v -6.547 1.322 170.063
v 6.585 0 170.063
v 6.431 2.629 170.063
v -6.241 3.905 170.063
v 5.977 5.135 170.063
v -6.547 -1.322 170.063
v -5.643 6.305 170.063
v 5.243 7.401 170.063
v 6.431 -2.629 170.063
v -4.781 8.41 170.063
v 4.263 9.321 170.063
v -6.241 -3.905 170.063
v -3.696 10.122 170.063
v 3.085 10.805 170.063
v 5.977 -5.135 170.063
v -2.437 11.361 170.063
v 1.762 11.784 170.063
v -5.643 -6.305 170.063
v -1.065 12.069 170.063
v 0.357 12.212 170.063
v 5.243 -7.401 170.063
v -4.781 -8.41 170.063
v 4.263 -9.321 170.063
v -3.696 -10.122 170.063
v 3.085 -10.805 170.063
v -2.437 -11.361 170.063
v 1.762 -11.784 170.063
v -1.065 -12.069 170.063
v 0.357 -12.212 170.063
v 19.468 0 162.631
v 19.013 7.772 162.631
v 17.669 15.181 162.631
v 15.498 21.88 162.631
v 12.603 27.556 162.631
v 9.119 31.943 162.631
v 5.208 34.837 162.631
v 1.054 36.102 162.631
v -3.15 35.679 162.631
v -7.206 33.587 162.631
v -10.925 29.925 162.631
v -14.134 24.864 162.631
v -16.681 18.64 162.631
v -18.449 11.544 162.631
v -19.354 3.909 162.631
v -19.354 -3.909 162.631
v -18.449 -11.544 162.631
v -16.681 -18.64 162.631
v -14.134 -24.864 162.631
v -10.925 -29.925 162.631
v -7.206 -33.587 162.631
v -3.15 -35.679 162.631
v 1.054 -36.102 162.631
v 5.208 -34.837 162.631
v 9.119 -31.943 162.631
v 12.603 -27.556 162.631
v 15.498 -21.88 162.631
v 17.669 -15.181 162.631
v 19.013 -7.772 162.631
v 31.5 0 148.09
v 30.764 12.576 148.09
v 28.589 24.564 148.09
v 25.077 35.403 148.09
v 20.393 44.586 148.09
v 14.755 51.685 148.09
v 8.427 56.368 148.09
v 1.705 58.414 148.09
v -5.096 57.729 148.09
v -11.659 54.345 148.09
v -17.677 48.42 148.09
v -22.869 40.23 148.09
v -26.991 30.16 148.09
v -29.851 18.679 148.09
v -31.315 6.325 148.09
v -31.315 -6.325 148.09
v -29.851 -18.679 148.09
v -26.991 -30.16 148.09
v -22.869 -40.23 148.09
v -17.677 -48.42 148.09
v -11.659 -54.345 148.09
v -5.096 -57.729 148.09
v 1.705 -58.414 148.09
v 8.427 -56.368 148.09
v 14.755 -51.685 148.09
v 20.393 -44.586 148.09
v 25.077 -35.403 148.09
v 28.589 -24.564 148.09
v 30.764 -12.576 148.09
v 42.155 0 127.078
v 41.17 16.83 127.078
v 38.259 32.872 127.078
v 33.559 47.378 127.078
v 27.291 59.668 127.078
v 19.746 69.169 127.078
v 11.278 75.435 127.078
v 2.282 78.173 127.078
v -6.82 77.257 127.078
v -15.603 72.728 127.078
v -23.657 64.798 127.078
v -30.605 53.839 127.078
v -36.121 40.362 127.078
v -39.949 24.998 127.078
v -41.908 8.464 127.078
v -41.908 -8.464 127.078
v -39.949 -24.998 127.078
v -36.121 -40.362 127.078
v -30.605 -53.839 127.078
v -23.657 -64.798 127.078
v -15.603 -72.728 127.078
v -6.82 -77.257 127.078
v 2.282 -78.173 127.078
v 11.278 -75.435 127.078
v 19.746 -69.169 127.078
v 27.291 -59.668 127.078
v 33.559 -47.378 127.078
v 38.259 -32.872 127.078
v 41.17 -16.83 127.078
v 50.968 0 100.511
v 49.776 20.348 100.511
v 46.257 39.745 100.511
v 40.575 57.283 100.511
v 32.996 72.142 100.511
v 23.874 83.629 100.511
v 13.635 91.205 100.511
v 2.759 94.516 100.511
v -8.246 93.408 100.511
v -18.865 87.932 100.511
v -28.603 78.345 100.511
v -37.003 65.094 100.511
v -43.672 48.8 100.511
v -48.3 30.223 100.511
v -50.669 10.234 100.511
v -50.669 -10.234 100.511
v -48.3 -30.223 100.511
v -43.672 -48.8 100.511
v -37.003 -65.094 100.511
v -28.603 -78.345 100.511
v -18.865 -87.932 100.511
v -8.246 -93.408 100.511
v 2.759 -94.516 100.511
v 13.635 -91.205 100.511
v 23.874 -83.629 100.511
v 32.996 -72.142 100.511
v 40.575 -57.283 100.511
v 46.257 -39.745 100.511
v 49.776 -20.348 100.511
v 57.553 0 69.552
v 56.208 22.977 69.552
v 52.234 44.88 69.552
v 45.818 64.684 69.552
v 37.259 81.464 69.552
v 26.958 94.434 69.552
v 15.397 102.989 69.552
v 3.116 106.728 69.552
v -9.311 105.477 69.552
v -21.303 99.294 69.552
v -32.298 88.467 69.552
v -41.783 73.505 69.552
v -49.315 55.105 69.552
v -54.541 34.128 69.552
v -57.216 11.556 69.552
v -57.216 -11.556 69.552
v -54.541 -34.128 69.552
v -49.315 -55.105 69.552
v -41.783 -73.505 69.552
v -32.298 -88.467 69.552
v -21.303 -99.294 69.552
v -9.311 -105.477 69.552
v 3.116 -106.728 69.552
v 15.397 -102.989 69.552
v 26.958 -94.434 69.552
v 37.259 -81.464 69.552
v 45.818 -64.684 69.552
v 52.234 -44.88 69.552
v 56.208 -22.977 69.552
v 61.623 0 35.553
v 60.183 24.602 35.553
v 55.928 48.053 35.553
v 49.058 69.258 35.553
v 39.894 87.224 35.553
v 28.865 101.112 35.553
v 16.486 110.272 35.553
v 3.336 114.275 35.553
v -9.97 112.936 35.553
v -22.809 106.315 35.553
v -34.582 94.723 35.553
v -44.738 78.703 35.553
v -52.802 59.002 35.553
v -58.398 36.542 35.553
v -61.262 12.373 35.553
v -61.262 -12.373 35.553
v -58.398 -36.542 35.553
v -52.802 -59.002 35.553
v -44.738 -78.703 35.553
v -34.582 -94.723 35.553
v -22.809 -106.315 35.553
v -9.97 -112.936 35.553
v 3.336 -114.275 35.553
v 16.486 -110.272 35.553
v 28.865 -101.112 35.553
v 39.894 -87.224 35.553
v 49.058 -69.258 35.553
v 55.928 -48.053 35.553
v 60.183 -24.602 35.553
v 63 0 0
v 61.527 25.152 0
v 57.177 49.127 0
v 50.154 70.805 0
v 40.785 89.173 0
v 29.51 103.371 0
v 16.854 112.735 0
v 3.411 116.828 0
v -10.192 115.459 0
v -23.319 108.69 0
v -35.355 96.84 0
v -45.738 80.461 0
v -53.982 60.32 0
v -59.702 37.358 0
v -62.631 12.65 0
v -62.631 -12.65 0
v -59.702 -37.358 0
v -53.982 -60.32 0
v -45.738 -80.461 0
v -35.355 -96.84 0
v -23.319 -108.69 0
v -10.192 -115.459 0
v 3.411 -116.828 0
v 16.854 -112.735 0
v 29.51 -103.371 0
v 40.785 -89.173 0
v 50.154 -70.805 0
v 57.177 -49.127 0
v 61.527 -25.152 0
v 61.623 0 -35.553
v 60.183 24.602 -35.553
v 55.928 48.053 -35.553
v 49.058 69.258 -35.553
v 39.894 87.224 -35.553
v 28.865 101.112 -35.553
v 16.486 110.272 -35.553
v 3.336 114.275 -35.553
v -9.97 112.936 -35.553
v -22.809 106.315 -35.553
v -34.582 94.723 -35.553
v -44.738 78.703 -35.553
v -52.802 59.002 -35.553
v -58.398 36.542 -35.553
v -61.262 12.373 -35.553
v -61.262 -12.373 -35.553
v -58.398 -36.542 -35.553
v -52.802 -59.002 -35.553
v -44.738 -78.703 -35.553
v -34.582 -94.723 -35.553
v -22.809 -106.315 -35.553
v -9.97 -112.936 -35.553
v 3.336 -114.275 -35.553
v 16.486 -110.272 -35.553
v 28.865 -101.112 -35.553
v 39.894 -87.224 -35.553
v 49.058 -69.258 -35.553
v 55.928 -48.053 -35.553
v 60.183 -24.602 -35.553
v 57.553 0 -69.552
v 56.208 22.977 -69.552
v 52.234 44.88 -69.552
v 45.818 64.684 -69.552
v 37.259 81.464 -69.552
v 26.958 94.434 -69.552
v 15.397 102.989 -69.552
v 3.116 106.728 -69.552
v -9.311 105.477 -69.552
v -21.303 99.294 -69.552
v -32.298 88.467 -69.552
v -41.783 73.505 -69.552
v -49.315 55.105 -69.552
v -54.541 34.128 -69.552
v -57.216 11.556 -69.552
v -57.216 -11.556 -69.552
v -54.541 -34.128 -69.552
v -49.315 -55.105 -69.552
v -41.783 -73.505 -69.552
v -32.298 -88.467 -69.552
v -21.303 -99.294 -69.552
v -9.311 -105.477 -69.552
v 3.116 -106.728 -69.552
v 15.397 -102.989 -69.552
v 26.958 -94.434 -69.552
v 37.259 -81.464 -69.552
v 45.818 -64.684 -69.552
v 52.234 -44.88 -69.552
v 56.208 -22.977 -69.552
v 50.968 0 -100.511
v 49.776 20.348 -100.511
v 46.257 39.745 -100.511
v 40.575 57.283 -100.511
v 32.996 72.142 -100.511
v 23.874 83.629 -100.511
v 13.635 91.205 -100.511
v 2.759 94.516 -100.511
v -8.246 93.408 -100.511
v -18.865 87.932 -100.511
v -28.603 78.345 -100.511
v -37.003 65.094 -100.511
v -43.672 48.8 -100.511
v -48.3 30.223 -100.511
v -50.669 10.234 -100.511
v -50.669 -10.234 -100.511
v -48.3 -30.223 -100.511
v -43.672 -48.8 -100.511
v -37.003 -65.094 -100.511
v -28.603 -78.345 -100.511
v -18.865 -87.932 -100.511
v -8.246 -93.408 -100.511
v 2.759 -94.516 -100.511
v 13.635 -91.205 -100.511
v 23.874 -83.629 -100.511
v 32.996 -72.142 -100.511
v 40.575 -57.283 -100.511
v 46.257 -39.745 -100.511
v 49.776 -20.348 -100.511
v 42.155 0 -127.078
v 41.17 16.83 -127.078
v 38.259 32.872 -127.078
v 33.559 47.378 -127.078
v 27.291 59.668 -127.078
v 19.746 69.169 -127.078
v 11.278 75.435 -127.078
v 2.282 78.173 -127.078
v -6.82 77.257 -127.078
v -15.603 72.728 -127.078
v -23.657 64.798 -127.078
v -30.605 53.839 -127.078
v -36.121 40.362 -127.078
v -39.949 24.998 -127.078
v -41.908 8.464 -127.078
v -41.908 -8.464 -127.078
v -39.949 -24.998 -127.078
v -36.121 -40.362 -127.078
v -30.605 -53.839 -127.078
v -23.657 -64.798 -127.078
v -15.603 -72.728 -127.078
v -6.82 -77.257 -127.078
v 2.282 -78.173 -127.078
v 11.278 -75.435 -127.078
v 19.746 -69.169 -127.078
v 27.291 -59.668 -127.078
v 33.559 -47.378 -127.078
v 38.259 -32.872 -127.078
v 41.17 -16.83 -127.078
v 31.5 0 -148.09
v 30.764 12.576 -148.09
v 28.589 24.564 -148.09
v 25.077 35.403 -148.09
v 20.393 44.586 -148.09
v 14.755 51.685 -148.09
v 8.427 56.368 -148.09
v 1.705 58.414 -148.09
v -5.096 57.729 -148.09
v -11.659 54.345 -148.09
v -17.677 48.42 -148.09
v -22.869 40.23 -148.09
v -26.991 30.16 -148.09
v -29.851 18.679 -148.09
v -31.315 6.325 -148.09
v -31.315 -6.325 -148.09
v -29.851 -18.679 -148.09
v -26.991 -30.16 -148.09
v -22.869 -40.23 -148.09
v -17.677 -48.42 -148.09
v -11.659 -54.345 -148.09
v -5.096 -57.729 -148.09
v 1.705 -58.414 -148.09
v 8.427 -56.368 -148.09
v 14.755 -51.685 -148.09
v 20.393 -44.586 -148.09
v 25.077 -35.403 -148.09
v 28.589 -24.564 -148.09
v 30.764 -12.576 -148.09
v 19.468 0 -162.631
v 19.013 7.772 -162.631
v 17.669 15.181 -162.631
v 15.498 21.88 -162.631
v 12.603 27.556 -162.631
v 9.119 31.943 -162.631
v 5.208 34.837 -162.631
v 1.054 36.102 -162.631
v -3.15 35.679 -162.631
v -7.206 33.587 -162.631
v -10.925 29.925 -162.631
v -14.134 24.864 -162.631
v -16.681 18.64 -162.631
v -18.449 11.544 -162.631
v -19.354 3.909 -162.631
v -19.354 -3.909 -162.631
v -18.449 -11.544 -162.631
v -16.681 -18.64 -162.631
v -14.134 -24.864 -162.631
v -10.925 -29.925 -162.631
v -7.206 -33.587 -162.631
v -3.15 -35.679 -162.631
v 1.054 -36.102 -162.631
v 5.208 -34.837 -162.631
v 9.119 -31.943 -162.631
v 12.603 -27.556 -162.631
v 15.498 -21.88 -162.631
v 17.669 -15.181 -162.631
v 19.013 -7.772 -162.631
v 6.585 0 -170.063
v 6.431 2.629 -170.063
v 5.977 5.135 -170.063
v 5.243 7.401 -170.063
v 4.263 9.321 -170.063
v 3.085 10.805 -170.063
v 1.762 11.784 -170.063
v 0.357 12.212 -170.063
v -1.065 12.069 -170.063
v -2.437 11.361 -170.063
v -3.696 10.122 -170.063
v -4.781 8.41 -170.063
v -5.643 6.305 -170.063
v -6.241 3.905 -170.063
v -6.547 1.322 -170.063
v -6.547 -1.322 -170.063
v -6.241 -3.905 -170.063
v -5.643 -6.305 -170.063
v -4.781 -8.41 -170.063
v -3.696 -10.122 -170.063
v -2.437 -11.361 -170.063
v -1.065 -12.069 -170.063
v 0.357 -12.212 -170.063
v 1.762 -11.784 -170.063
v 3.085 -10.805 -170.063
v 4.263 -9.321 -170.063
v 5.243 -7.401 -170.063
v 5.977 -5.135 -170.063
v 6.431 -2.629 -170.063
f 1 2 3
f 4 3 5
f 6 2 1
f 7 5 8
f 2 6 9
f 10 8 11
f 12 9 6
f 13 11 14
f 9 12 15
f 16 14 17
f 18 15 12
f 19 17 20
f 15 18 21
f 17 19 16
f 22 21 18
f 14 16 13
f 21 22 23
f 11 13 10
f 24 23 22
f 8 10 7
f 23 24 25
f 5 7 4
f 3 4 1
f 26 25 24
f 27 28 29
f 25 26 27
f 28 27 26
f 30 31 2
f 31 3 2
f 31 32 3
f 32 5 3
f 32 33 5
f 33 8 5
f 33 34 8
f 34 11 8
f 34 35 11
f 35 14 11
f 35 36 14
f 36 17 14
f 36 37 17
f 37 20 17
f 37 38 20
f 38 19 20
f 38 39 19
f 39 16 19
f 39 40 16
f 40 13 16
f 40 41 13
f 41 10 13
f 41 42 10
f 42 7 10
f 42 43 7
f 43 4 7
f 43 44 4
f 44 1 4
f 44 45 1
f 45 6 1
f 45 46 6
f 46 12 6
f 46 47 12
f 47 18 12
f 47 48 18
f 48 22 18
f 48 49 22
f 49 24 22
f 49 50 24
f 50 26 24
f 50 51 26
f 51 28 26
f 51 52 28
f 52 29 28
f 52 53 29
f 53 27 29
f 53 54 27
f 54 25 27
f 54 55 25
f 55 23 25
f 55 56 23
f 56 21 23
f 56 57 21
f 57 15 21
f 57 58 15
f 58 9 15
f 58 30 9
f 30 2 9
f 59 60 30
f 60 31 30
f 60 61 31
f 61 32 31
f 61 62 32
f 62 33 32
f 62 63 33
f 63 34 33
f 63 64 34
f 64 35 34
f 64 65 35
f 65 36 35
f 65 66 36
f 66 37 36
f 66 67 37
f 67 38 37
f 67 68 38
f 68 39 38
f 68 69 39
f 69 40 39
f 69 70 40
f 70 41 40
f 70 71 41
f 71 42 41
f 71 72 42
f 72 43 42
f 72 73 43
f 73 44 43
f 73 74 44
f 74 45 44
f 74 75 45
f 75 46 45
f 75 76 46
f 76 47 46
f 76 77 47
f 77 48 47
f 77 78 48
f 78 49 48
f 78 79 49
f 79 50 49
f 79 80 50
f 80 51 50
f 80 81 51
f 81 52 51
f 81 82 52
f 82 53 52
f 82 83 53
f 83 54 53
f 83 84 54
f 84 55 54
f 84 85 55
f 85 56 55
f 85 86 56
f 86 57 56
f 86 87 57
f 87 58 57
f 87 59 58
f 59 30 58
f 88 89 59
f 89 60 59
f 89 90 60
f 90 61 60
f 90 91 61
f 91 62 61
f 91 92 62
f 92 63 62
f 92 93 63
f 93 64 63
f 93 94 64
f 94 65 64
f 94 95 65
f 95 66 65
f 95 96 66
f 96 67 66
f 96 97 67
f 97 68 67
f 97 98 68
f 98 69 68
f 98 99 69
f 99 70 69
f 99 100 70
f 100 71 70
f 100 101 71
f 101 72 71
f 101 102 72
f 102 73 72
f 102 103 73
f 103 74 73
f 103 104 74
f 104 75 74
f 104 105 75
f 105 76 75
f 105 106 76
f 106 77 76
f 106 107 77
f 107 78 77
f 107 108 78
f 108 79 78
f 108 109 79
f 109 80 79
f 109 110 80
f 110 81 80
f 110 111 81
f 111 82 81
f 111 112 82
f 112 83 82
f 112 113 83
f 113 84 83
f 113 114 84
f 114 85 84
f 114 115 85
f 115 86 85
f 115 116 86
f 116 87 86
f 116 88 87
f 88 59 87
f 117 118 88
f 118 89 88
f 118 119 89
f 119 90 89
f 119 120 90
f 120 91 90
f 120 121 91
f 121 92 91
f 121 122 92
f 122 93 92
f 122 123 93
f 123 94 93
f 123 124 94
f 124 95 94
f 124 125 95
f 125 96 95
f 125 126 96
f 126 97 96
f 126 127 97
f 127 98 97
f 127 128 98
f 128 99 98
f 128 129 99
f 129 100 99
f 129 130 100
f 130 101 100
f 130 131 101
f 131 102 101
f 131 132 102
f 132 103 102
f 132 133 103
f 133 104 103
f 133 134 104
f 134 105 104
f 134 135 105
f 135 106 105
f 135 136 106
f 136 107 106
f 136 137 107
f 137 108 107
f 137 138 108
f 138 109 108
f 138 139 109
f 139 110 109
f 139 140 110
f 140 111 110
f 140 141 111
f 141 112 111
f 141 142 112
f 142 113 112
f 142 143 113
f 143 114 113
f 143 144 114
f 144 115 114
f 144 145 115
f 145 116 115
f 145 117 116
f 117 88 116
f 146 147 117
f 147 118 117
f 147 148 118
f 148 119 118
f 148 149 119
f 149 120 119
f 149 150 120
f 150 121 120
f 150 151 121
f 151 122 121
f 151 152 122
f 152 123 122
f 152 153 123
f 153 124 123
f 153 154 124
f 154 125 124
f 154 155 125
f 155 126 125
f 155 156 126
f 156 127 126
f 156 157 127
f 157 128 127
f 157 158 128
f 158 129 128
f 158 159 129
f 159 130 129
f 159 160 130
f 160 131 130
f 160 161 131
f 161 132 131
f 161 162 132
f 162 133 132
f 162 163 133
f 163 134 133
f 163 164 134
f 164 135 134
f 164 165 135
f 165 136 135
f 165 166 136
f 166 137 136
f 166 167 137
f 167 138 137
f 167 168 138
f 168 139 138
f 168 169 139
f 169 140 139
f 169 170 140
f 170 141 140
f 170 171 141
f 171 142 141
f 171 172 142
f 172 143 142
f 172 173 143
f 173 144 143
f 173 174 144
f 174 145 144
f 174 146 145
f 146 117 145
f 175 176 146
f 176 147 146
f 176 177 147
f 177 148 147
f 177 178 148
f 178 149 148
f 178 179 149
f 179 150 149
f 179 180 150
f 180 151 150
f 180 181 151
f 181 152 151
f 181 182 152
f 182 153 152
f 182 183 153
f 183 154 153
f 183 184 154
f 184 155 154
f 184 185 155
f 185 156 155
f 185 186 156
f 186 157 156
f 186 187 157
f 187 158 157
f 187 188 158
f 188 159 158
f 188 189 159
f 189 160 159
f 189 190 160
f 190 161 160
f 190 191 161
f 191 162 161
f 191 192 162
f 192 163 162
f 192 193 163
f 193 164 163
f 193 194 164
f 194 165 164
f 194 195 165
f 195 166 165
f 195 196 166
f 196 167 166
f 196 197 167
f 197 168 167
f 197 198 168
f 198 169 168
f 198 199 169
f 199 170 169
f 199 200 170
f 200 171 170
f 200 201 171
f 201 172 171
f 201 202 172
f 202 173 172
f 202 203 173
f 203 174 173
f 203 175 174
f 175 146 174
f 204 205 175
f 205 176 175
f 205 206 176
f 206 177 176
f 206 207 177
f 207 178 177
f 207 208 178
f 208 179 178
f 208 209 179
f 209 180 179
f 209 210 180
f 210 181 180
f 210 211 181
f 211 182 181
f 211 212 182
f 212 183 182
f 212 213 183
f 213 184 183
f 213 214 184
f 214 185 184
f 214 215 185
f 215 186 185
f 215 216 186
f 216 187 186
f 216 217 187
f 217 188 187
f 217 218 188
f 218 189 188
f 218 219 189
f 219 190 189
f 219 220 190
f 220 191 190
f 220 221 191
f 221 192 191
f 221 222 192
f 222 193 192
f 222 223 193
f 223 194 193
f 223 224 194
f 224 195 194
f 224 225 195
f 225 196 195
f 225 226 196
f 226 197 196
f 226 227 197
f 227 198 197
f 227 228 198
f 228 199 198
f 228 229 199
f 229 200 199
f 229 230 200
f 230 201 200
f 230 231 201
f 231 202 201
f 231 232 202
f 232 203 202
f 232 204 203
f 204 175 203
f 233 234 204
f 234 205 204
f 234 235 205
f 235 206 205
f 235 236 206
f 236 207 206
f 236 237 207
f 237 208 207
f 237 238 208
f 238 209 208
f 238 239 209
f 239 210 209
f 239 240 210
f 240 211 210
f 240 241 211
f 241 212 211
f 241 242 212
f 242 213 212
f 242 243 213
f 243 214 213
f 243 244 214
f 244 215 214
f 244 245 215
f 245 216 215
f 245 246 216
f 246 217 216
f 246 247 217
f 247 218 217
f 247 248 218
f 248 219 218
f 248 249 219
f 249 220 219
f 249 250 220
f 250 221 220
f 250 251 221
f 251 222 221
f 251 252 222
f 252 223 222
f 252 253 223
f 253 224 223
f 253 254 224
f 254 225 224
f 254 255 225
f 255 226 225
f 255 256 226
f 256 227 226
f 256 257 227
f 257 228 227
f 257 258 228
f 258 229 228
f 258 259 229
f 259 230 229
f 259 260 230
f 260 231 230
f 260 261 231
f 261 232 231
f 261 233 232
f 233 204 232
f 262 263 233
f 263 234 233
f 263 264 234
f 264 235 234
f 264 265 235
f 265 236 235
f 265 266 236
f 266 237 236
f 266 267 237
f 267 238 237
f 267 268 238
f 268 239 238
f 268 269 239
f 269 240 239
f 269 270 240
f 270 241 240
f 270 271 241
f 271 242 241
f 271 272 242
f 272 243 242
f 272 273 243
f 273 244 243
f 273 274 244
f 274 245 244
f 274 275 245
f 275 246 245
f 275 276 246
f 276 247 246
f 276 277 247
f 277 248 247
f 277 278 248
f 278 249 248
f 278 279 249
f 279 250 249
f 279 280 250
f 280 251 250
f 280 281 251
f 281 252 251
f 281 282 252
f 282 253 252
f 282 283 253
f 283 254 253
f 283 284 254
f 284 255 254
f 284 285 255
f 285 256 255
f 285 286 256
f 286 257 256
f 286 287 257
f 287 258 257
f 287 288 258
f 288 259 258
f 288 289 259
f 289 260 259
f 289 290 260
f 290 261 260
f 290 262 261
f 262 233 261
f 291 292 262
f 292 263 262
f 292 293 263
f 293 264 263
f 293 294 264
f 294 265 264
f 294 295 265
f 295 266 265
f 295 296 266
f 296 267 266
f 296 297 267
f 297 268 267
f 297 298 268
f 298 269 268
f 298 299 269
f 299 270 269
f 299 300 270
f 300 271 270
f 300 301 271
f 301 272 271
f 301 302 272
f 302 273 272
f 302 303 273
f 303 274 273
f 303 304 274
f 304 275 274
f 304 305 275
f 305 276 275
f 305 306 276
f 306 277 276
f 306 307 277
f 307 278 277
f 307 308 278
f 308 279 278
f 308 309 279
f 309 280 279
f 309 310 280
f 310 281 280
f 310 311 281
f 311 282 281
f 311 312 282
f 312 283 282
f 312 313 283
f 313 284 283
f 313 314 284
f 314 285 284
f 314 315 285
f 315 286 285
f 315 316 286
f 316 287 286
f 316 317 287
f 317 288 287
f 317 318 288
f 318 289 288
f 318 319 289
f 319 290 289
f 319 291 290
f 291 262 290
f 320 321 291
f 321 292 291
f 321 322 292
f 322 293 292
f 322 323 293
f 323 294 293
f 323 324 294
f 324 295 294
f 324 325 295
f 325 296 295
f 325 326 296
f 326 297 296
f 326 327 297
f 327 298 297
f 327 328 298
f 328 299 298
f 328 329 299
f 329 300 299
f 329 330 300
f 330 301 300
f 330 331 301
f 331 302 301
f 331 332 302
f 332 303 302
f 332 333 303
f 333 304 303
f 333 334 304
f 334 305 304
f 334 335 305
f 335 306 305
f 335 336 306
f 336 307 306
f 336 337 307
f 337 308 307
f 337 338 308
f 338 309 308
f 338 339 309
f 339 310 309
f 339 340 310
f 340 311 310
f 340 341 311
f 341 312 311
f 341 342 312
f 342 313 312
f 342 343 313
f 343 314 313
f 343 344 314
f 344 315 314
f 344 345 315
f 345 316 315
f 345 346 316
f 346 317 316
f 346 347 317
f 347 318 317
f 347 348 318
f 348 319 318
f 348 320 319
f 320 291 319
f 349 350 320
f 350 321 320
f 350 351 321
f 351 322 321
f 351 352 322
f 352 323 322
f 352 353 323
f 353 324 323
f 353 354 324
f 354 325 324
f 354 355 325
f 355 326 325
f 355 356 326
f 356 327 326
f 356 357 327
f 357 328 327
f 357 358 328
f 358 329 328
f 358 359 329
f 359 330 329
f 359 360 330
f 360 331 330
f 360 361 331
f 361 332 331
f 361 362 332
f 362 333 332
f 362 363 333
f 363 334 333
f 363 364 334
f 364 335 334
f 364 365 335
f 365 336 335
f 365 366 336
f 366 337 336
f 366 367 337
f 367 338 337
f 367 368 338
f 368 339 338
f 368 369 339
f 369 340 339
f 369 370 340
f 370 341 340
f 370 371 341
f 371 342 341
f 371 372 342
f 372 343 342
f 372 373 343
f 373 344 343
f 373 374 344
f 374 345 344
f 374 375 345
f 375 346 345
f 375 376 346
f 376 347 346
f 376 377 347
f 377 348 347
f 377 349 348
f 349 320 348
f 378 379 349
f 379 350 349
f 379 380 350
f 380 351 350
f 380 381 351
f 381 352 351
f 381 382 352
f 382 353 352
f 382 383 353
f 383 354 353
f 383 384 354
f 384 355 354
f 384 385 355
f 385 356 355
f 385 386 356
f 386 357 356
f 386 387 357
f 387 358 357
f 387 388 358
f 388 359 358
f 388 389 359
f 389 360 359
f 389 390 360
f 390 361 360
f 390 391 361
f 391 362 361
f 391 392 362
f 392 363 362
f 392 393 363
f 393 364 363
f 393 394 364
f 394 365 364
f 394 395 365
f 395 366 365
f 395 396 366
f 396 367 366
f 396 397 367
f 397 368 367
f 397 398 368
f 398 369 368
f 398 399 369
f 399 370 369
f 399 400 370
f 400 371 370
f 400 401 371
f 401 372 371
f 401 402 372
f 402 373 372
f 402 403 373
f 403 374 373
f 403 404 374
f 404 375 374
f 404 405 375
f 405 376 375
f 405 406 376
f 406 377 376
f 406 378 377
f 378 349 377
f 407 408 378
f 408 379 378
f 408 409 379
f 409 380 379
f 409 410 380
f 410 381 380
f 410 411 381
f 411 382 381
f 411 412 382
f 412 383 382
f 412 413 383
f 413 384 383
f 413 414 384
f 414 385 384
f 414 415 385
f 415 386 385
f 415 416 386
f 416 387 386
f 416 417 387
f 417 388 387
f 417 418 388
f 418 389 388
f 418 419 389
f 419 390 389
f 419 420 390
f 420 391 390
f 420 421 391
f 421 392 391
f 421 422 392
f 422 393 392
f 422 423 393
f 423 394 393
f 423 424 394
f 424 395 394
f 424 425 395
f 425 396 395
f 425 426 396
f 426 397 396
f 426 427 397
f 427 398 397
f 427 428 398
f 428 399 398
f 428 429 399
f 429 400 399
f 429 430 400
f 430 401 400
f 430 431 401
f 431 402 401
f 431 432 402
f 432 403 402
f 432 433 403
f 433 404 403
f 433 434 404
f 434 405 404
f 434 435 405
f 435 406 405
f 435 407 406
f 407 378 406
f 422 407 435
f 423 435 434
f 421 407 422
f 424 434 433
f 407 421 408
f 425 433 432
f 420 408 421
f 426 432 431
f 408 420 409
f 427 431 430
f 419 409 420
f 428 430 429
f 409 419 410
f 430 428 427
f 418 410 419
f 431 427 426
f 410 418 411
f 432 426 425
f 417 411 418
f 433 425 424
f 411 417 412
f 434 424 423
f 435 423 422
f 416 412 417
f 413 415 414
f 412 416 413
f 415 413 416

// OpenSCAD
// Generated by SolidPython 1.0.1 on 2020-07-29 00:46:47


scale(v = [7, 13, 19]) {
	sphere(r = 9);
}
/***********************************************
*********      SolidPython code:      **********
************************************************
 
# import packages: SolidPython
from solid import *
from solid.utils import *
from itertools import chain, combinations, permutations


class Resize:

    def __init__(self, scad_file):
        self.scad_file = scad_file
        #self.scad_file = import_scad(scad_file)
        # cone/cylinder param:
        self.r1 = 0
        self.r2 = 0
        self.h = 0
        # rectangular prism param:
        self.w = 0
        self.l = 0
        # ellipse param:
        self.r = 0

    # import OpenScad code (file name corresponds to shape)


    # classify shape + parameters
    def assign(self, param1, param2, param3):
        if self.scad_file == 'cone.scad':
            self.r1 = param1
            self.r2 = param2
            self.h = param3
        elif self.scad_file == 'cylinder.scad':
            self.r1 = param1
            self.r2 = param2
            self.h = param3
        elif self.scad_file == 'rectangularPrism.scad':
            self.h = param1
            self.l = param2
            self.w = param3
        else:
            self.r = param1
            self.h = param2

    # resize parameters
    def iterate(self):
        x = range(3, 20, 2)
        i = 1
        if self.scad_file == 'cone.scad':
            tempList = list(permutations(x, 2))
            for temp in tempList:
                param1 = temp[0]
                param2 = temp[1]
                filepath = 'produced_scad_files/' + 'cone' + str(param1) + '_' + str(param2) + '_' + '.scad'
                scad_render_to_file(cylinder(h=param1, r1=param2, r2=0), filepath)

        elif self.scad_file == 'cylinder.scad':
            tempList = list(permutations(x, 3))
            for temp in tempList:
                param1 = temp[0]
                param2 = temp[1]
                filepath = 'produced_scad_files/' + 'cylinder' + str(param1) + '_' + str(param2) + '_' + '.scad'
                scad_render_to_file(cylinder(h=param1, r1=param2, r2=param2), filepath)

        elif self.scad_file == 'rectangularPrism.scad':
            tempList = list(permutations(x, 3))
            for temp in tempList:
                param1 = temp[0]
                param2 = temp[1]
                param3 = temp[2]
                filepath = 'produced_scad_files/' + 'rectangularPrism' + str(param1) + '_' + str(param2) + '_' + str(
                    param3) + '.scad'
                scad_render_to_file(cube(size=(param1, param2, param3)), filepath)

        elif self.scad_file == 'ellipse.scad':
            tempList = list(permutations(x, 4))
            for temp in tempList:
                param1 = temp[0]
                param2 = temp[1]
                param3 = temp[2]
                param4 = temp[3]
                filepath = 'produced_scad_files/' + 'ellipse' + str(param1) + '_' + str(param2) + '_' + str(param3) + '_' + str(param4) + '.scad'
                scad_render_to_file(scale([param1, param2, param3])(sphere(r=param4)), filepath)

    def render_to_scadfile(self):
        scad_render_to_file(scad, 'example.scad') 
 
************************************************/
